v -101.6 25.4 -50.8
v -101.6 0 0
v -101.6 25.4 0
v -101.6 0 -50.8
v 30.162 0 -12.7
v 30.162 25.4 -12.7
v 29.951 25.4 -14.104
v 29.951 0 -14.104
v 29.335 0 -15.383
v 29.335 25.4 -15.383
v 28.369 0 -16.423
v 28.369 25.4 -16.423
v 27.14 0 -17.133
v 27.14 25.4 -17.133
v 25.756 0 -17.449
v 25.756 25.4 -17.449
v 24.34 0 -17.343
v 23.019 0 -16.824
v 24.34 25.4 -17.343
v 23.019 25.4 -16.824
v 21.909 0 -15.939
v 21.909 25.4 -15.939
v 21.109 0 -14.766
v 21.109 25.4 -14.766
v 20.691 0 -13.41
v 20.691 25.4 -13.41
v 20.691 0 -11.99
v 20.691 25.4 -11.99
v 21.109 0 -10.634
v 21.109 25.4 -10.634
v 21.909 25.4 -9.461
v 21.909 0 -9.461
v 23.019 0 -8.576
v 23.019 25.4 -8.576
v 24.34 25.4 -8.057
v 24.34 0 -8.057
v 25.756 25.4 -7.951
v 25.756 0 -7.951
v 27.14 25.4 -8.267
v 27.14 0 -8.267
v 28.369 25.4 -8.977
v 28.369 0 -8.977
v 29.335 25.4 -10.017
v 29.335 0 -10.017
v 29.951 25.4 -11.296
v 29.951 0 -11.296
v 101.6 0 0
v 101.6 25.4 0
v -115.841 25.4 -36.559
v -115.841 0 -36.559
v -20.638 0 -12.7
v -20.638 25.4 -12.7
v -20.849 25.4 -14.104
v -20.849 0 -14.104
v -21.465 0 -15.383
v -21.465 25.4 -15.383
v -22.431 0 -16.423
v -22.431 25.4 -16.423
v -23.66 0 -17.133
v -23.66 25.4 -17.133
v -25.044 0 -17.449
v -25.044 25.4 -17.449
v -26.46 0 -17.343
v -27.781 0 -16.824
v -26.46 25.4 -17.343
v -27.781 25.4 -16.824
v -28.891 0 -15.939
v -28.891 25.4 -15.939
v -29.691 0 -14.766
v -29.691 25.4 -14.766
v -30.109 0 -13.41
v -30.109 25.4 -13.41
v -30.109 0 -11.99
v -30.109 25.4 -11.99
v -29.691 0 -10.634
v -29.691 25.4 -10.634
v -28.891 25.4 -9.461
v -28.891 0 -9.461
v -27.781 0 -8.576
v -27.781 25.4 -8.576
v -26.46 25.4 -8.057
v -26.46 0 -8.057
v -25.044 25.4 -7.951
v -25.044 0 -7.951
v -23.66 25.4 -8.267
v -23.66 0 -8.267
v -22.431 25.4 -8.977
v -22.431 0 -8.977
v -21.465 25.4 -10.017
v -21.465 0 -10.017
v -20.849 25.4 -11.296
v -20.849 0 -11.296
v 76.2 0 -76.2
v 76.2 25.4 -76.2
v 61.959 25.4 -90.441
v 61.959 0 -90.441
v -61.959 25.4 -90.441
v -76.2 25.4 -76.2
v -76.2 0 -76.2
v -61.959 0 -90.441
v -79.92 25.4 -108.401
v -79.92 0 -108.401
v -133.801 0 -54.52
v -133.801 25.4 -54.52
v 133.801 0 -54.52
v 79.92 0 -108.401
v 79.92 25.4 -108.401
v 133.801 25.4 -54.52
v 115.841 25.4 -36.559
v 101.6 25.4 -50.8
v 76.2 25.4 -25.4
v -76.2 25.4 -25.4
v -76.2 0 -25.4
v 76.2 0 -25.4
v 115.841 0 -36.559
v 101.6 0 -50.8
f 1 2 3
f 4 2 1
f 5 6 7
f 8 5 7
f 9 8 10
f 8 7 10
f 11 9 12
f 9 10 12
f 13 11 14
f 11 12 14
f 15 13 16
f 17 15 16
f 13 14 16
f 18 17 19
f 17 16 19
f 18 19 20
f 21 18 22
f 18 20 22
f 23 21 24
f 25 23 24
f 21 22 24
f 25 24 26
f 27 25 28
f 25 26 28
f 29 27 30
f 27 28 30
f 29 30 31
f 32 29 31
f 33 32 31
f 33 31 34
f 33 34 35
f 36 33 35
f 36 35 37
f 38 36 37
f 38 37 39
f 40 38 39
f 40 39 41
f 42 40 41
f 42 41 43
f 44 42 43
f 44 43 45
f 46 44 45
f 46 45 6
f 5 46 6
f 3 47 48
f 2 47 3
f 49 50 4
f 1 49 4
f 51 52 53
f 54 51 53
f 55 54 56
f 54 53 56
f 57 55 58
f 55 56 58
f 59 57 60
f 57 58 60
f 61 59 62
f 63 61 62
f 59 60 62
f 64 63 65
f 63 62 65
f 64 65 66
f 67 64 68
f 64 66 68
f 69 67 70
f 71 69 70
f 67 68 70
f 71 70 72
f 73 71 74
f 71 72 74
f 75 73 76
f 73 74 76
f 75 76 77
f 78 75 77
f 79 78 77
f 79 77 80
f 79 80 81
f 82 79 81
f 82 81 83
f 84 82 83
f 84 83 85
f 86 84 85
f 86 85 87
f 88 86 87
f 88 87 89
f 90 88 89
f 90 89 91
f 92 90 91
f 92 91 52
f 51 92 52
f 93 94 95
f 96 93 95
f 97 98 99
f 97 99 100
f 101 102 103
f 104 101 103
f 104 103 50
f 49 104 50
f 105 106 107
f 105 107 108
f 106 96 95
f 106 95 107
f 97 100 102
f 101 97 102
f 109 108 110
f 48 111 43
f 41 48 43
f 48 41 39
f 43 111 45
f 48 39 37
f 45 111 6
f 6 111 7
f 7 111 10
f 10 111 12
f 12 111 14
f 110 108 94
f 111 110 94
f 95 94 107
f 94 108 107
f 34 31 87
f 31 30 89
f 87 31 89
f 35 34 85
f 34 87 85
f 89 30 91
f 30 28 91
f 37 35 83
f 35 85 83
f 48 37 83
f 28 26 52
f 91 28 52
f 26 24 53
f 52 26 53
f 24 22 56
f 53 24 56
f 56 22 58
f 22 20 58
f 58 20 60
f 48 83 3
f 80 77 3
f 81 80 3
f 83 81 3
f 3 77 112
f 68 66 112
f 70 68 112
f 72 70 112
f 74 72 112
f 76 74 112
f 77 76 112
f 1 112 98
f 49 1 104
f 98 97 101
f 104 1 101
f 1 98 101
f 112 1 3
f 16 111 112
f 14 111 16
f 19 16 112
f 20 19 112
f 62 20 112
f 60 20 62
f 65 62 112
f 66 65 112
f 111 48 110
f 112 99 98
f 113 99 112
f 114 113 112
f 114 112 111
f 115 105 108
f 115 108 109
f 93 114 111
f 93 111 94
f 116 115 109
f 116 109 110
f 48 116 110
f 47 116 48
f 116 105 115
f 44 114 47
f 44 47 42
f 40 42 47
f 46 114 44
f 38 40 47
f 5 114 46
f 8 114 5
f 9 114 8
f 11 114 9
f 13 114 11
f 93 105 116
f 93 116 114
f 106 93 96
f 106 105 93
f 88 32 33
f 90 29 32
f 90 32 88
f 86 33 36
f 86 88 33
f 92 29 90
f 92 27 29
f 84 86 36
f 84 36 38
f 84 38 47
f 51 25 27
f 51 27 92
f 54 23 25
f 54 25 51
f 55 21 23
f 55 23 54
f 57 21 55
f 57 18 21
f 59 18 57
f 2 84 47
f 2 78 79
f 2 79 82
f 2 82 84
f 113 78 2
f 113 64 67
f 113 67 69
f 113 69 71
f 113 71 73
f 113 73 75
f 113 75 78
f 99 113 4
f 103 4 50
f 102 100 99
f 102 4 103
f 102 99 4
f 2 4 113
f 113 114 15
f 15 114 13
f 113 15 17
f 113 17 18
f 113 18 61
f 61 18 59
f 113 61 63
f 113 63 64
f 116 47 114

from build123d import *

# Parameters (mm, degrees)
BOSS_EXTRUDE1_DEPTH     = 25.4
SKETCH2_R               = 4.7625
CUT_EXTRUDE1_DEPTH      = 1
CUT_EXTRUDE1_DEPTH_BACK = 26.4


with BuildPart() as part:
    # Sketch1 → Boss-Extrude1 (new body)
    with BuildSketch(Plane(origin=(0, 0, 0), x_dir=(1, 0, 0), z_dir=(0, 1, 0))):
        Polygon((101.6, 0), (-101.6, 0), (-101.6, 50.8), (-76.2, 76.2), (-76.2, 25.4), (76.2, 25.4), (76.2, 76.2), (101.6, 50.8), align=None)
        Polygon((-76.2, 76.2), (-61.959231637, 90.440768363), (-79.919743879, 108.401280605), (-133.801280605, 54.519743879), (-115.840768363, 36.559231637), (-101.6, 50.8), align=None)
        Polygon((101.6, 50.8), (76.2, 76.2), (61.959231637, 90.440768363), (79.919743879, 108.401280605), (133.801280605, 54.519743879), (115.840768363, 36.559231637), align=None)
    extrude(amount=BOSS_EXTRUDE1_DEPTH)

    # Sketch2 → Cut-Extrude1 (cut, two sides)
    with BuildSketch(Plane(origin=(0, 25.4, 0), x_dir=(1, 0, 0), z_dir=(0, 1, 0))) as cut_extrude1_sk:
        with Locations((25.4, 12.7)):
            Circle(SKETCH2_R)
        with Locations((-25.4, 12.7)):
            Circle(SKETCH2_R)
    extrude(amount=CUT_EXTRUDE1_DEPTH, mode=Mode.SUBTRACT)
    extrude(cut_extrude1_sk.sketch, amount=-CUT_EXTRUDE1_DEPTH_BACK, mode=Mode.SUBTRACT)


solid = part.part
